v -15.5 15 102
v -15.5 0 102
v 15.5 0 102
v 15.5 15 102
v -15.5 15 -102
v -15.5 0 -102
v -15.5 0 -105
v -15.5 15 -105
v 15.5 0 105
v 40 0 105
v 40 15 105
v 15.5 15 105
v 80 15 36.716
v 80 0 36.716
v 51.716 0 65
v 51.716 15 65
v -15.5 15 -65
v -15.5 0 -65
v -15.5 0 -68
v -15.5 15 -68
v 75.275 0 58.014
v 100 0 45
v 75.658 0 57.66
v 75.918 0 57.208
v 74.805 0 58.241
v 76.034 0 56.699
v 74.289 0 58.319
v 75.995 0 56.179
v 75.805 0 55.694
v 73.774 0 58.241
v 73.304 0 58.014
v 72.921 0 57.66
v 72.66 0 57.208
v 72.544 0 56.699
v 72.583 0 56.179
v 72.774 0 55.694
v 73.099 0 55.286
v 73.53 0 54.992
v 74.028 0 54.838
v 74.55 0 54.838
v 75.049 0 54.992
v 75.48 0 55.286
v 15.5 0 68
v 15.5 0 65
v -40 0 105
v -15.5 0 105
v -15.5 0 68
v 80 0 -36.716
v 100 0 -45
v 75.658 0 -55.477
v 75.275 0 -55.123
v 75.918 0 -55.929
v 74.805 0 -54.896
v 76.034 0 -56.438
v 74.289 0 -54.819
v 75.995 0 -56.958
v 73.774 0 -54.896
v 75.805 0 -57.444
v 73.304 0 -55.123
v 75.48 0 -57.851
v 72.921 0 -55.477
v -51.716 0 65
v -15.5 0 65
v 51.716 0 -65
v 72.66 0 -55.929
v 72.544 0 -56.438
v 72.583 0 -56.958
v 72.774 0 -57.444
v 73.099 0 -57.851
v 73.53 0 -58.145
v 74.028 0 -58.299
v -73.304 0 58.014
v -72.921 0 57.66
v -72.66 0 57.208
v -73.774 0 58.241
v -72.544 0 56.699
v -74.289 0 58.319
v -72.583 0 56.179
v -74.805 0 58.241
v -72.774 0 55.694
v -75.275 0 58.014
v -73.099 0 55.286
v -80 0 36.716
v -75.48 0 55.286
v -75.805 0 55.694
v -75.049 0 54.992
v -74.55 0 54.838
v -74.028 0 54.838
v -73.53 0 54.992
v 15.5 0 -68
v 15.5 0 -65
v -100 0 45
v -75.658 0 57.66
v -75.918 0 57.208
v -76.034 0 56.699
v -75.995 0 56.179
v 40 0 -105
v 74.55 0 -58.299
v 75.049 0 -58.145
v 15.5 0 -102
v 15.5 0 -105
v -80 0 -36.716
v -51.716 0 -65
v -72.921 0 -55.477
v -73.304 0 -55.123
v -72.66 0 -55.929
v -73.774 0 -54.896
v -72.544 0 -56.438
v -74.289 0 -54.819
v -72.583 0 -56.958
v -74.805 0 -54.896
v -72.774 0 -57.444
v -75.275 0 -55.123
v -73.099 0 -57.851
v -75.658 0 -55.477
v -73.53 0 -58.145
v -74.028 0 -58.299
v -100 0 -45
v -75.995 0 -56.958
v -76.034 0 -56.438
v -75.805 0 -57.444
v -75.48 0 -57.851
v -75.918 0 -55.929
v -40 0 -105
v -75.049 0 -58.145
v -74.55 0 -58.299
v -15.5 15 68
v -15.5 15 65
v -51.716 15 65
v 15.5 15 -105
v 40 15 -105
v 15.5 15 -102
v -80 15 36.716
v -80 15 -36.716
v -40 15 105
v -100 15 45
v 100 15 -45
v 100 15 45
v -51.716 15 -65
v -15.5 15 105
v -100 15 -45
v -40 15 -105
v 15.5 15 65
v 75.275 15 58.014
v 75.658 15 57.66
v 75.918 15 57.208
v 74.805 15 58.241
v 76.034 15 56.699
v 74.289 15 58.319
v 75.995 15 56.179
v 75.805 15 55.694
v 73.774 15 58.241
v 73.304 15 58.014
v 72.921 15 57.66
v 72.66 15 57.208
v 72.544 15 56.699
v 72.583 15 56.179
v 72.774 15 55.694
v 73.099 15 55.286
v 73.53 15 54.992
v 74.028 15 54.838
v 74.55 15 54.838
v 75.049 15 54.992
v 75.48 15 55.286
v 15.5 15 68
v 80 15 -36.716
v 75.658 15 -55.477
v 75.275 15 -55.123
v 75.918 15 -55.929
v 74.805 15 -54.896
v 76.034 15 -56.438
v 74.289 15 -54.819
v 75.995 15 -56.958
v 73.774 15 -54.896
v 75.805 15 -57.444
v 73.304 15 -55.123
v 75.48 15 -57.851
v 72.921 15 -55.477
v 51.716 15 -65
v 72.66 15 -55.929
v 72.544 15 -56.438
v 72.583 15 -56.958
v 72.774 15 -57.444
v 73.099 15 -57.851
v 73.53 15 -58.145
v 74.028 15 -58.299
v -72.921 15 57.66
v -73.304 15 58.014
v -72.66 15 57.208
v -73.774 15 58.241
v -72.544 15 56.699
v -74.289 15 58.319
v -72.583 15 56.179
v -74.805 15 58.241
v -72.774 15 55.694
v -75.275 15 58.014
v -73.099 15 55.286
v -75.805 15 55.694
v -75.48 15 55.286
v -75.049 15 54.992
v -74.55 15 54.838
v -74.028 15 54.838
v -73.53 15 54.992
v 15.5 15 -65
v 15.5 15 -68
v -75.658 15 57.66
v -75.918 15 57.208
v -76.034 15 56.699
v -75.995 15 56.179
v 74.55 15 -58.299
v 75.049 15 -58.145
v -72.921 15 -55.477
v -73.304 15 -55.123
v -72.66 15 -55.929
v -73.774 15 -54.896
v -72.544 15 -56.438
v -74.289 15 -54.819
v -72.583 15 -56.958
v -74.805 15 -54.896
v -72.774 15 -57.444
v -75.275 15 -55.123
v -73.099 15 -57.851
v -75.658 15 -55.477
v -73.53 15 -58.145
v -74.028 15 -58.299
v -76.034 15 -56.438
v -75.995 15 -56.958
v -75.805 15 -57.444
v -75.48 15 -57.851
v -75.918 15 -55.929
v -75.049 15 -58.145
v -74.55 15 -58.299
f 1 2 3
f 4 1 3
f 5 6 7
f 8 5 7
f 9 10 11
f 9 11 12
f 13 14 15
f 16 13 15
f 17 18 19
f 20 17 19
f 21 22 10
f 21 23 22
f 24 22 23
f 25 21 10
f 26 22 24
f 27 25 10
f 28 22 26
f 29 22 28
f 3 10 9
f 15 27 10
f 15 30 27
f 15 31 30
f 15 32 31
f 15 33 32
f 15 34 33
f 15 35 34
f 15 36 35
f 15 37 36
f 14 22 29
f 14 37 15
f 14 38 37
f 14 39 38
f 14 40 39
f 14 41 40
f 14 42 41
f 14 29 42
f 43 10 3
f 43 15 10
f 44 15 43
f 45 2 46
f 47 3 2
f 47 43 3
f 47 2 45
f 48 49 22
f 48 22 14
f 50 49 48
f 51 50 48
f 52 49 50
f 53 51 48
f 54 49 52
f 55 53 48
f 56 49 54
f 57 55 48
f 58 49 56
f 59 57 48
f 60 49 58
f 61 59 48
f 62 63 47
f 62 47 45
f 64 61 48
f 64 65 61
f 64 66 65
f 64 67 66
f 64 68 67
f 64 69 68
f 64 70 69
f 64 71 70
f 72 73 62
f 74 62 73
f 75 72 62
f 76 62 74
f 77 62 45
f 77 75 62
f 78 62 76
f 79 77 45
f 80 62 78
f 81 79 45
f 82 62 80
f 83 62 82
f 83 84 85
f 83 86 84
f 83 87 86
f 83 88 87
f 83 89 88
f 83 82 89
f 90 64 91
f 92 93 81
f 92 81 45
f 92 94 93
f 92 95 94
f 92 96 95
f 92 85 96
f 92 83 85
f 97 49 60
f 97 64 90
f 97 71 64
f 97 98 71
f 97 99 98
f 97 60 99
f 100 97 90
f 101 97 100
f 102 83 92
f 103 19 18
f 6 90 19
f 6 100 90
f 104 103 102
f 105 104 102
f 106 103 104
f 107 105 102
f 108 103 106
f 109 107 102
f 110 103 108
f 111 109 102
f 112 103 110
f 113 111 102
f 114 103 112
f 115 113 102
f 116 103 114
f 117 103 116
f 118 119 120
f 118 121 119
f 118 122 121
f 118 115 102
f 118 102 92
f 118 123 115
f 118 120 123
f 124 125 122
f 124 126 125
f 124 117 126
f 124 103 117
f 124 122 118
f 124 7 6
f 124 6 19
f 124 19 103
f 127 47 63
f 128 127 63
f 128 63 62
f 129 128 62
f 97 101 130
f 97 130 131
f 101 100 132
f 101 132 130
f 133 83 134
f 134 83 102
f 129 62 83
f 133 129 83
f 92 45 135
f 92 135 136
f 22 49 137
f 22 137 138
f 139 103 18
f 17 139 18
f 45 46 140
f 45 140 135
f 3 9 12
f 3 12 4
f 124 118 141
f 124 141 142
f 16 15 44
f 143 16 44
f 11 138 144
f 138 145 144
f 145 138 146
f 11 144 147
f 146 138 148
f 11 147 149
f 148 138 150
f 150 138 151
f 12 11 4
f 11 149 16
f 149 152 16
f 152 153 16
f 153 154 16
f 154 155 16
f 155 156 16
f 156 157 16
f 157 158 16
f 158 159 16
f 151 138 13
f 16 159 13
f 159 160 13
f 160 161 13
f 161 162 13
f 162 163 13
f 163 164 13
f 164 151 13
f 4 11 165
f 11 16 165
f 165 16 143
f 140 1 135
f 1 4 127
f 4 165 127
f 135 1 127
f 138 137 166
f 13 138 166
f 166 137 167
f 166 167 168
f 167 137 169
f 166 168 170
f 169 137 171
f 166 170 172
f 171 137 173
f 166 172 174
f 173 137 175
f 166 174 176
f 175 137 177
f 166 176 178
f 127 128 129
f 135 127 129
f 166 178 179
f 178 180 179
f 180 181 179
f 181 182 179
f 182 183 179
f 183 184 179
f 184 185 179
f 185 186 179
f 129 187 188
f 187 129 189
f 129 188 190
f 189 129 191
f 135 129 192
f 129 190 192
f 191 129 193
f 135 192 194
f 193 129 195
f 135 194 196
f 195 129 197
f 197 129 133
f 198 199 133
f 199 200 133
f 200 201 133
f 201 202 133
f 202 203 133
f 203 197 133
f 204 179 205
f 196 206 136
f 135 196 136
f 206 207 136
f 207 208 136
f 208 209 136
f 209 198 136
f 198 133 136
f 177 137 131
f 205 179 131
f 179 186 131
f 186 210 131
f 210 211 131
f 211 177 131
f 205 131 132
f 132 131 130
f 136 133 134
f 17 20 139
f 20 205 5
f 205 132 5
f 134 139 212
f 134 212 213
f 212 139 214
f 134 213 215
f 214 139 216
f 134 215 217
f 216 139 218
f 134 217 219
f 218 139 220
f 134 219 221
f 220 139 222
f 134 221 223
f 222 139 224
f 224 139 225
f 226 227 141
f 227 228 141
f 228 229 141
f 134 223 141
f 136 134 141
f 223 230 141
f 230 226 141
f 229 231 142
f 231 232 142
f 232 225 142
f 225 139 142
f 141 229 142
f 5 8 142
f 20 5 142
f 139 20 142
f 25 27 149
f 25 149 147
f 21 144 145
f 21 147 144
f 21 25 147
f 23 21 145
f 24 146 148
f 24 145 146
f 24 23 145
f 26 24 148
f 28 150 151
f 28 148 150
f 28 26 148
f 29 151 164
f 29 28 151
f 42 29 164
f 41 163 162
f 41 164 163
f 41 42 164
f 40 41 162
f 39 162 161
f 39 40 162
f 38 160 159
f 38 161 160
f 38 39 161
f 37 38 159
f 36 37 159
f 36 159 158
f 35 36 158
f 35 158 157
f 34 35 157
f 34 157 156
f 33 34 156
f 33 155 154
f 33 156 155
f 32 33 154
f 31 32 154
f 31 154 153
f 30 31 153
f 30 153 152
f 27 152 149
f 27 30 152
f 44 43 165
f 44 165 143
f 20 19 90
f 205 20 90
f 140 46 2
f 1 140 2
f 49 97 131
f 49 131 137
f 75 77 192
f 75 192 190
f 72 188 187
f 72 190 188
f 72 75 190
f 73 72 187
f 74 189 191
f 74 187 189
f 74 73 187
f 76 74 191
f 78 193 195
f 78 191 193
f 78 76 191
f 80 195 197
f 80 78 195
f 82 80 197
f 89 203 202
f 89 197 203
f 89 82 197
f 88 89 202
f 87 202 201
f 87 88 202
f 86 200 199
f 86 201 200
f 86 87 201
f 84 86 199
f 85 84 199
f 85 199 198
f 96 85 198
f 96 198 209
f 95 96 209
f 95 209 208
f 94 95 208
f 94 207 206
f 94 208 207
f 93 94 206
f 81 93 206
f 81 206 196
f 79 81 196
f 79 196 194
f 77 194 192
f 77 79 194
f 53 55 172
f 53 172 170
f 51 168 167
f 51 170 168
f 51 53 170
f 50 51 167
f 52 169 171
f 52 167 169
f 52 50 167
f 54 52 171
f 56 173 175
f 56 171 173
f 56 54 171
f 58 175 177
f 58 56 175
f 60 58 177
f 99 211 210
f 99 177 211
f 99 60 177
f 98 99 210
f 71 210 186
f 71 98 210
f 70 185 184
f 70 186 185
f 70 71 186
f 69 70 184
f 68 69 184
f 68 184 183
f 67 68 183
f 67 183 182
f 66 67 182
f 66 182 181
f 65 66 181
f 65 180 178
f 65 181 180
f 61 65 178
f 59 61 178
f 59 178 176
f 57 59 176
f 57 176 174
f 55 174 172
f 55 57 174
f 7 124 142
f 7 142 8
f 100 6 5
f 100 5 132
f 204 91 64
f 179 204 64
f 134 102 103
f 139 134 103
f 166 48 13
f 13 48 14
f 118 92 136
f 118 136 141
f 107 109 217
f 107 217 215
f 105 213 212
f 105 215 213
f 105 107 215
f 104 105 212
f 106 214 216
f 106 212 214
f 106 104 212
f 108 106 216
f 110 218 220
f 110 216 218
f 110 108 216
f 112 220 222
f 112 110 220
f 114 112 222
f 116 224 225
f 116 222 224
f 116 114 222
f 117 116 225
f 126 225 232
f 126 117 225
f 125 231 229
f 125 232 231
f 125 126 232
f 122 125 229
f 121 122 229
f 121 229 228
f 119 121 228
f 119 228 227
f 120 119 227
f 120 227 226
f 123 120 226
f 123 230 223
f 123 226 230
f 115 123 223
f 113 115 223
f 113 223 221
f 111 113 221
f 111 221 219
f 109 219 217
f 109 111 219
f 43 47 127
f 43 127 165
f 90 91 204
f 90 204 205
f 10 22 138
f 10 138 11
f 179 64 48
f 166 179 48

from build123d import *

# Parameters (mm, degrees)
EXTRUDE_15_DEPTH         = 15
CUT_EXTRUDE_1_DEPTH      = 146.773797371
CUT_EXTRUDE_1_DEPTH_BACK = 146.773797371
SKETCH_2_R               = 1.75
SKETCH_2_W               = 31
SKETCH_2_H               = 3


with BuildPart() as part:
    # 草图1 → 15台 (new body)
    with BuildSketch(Plane(origin=(0, 0, 0), x_dir=(1, 0, 0), z_dir=(0, 1, 0))):
        Polygon((40, 105), (100, 45), (100, -45), (40, -105), (-40, -105), (-100, -45), (-100, 45), (-40, 105), align=None)
        Polygon((-80, -36.715728753), (-80, 36.715728753), (-51.715728753, 65), (51.715728753, 65), (80, 36.715728753), (80, -36.715728753), (51.715728753, -65), (-51.715728753, -65), align=None, mode=Mode.SUBTRACT)
    extrude(amount=EXTRUDE_15_DEPTH)

    # 草图2 → 切除-拉伸1 (cut, two sides: drawn at the far end of the back side and taken through both)
    with BuildSketch(Plane(origin=(0, 15, 0), x_dir=(1, 0, 0), z_dir=(0, 1, 0)).offset(-CUT_EXTRUDE_1_DEPTH_BACK)):
        with Locations(Location((-74.289321881, -56.568542495, 0), (0, 0, 270))):
            Circle(SKETCH_2_R)
        with Locations(Location((74.289321881, 56.568542495, 0), (0, 0, 270))):
            Circle(SKETCH_2_R)
        with Locations(Location((-74.289321881, 56.568542495, 0), (0, 0, 270))):
            Circle(SKETCH_2_R)
        with Locations(Location((74.289321881, -56.568542495, 0), (0, 0, 270))):
            Circle(SKETCH_2_R)
        with Locations((0, 103.5)):
            Rectangle(SKETCH_2_W, SKETCH_2_H)
        with Locations((0, 66.5)):
            Rectangle(SKETCH_2_W, SKETCH_2_H)
        with Locations((0, -66.5)):
            Rectangle(SKETCH_2_W, SKETCH_2_H)
        with Locations((0, -103.5)):
            Rectangle(SKETCH_2_W, SKETCH_2_H)
    extrude(amount=CUT_EXTRUDE_1_DEPTH + CUT_EXTRUDE_1_DEPTH_BACK, mode=Mode.SUBTRACT)


solid = part.part
